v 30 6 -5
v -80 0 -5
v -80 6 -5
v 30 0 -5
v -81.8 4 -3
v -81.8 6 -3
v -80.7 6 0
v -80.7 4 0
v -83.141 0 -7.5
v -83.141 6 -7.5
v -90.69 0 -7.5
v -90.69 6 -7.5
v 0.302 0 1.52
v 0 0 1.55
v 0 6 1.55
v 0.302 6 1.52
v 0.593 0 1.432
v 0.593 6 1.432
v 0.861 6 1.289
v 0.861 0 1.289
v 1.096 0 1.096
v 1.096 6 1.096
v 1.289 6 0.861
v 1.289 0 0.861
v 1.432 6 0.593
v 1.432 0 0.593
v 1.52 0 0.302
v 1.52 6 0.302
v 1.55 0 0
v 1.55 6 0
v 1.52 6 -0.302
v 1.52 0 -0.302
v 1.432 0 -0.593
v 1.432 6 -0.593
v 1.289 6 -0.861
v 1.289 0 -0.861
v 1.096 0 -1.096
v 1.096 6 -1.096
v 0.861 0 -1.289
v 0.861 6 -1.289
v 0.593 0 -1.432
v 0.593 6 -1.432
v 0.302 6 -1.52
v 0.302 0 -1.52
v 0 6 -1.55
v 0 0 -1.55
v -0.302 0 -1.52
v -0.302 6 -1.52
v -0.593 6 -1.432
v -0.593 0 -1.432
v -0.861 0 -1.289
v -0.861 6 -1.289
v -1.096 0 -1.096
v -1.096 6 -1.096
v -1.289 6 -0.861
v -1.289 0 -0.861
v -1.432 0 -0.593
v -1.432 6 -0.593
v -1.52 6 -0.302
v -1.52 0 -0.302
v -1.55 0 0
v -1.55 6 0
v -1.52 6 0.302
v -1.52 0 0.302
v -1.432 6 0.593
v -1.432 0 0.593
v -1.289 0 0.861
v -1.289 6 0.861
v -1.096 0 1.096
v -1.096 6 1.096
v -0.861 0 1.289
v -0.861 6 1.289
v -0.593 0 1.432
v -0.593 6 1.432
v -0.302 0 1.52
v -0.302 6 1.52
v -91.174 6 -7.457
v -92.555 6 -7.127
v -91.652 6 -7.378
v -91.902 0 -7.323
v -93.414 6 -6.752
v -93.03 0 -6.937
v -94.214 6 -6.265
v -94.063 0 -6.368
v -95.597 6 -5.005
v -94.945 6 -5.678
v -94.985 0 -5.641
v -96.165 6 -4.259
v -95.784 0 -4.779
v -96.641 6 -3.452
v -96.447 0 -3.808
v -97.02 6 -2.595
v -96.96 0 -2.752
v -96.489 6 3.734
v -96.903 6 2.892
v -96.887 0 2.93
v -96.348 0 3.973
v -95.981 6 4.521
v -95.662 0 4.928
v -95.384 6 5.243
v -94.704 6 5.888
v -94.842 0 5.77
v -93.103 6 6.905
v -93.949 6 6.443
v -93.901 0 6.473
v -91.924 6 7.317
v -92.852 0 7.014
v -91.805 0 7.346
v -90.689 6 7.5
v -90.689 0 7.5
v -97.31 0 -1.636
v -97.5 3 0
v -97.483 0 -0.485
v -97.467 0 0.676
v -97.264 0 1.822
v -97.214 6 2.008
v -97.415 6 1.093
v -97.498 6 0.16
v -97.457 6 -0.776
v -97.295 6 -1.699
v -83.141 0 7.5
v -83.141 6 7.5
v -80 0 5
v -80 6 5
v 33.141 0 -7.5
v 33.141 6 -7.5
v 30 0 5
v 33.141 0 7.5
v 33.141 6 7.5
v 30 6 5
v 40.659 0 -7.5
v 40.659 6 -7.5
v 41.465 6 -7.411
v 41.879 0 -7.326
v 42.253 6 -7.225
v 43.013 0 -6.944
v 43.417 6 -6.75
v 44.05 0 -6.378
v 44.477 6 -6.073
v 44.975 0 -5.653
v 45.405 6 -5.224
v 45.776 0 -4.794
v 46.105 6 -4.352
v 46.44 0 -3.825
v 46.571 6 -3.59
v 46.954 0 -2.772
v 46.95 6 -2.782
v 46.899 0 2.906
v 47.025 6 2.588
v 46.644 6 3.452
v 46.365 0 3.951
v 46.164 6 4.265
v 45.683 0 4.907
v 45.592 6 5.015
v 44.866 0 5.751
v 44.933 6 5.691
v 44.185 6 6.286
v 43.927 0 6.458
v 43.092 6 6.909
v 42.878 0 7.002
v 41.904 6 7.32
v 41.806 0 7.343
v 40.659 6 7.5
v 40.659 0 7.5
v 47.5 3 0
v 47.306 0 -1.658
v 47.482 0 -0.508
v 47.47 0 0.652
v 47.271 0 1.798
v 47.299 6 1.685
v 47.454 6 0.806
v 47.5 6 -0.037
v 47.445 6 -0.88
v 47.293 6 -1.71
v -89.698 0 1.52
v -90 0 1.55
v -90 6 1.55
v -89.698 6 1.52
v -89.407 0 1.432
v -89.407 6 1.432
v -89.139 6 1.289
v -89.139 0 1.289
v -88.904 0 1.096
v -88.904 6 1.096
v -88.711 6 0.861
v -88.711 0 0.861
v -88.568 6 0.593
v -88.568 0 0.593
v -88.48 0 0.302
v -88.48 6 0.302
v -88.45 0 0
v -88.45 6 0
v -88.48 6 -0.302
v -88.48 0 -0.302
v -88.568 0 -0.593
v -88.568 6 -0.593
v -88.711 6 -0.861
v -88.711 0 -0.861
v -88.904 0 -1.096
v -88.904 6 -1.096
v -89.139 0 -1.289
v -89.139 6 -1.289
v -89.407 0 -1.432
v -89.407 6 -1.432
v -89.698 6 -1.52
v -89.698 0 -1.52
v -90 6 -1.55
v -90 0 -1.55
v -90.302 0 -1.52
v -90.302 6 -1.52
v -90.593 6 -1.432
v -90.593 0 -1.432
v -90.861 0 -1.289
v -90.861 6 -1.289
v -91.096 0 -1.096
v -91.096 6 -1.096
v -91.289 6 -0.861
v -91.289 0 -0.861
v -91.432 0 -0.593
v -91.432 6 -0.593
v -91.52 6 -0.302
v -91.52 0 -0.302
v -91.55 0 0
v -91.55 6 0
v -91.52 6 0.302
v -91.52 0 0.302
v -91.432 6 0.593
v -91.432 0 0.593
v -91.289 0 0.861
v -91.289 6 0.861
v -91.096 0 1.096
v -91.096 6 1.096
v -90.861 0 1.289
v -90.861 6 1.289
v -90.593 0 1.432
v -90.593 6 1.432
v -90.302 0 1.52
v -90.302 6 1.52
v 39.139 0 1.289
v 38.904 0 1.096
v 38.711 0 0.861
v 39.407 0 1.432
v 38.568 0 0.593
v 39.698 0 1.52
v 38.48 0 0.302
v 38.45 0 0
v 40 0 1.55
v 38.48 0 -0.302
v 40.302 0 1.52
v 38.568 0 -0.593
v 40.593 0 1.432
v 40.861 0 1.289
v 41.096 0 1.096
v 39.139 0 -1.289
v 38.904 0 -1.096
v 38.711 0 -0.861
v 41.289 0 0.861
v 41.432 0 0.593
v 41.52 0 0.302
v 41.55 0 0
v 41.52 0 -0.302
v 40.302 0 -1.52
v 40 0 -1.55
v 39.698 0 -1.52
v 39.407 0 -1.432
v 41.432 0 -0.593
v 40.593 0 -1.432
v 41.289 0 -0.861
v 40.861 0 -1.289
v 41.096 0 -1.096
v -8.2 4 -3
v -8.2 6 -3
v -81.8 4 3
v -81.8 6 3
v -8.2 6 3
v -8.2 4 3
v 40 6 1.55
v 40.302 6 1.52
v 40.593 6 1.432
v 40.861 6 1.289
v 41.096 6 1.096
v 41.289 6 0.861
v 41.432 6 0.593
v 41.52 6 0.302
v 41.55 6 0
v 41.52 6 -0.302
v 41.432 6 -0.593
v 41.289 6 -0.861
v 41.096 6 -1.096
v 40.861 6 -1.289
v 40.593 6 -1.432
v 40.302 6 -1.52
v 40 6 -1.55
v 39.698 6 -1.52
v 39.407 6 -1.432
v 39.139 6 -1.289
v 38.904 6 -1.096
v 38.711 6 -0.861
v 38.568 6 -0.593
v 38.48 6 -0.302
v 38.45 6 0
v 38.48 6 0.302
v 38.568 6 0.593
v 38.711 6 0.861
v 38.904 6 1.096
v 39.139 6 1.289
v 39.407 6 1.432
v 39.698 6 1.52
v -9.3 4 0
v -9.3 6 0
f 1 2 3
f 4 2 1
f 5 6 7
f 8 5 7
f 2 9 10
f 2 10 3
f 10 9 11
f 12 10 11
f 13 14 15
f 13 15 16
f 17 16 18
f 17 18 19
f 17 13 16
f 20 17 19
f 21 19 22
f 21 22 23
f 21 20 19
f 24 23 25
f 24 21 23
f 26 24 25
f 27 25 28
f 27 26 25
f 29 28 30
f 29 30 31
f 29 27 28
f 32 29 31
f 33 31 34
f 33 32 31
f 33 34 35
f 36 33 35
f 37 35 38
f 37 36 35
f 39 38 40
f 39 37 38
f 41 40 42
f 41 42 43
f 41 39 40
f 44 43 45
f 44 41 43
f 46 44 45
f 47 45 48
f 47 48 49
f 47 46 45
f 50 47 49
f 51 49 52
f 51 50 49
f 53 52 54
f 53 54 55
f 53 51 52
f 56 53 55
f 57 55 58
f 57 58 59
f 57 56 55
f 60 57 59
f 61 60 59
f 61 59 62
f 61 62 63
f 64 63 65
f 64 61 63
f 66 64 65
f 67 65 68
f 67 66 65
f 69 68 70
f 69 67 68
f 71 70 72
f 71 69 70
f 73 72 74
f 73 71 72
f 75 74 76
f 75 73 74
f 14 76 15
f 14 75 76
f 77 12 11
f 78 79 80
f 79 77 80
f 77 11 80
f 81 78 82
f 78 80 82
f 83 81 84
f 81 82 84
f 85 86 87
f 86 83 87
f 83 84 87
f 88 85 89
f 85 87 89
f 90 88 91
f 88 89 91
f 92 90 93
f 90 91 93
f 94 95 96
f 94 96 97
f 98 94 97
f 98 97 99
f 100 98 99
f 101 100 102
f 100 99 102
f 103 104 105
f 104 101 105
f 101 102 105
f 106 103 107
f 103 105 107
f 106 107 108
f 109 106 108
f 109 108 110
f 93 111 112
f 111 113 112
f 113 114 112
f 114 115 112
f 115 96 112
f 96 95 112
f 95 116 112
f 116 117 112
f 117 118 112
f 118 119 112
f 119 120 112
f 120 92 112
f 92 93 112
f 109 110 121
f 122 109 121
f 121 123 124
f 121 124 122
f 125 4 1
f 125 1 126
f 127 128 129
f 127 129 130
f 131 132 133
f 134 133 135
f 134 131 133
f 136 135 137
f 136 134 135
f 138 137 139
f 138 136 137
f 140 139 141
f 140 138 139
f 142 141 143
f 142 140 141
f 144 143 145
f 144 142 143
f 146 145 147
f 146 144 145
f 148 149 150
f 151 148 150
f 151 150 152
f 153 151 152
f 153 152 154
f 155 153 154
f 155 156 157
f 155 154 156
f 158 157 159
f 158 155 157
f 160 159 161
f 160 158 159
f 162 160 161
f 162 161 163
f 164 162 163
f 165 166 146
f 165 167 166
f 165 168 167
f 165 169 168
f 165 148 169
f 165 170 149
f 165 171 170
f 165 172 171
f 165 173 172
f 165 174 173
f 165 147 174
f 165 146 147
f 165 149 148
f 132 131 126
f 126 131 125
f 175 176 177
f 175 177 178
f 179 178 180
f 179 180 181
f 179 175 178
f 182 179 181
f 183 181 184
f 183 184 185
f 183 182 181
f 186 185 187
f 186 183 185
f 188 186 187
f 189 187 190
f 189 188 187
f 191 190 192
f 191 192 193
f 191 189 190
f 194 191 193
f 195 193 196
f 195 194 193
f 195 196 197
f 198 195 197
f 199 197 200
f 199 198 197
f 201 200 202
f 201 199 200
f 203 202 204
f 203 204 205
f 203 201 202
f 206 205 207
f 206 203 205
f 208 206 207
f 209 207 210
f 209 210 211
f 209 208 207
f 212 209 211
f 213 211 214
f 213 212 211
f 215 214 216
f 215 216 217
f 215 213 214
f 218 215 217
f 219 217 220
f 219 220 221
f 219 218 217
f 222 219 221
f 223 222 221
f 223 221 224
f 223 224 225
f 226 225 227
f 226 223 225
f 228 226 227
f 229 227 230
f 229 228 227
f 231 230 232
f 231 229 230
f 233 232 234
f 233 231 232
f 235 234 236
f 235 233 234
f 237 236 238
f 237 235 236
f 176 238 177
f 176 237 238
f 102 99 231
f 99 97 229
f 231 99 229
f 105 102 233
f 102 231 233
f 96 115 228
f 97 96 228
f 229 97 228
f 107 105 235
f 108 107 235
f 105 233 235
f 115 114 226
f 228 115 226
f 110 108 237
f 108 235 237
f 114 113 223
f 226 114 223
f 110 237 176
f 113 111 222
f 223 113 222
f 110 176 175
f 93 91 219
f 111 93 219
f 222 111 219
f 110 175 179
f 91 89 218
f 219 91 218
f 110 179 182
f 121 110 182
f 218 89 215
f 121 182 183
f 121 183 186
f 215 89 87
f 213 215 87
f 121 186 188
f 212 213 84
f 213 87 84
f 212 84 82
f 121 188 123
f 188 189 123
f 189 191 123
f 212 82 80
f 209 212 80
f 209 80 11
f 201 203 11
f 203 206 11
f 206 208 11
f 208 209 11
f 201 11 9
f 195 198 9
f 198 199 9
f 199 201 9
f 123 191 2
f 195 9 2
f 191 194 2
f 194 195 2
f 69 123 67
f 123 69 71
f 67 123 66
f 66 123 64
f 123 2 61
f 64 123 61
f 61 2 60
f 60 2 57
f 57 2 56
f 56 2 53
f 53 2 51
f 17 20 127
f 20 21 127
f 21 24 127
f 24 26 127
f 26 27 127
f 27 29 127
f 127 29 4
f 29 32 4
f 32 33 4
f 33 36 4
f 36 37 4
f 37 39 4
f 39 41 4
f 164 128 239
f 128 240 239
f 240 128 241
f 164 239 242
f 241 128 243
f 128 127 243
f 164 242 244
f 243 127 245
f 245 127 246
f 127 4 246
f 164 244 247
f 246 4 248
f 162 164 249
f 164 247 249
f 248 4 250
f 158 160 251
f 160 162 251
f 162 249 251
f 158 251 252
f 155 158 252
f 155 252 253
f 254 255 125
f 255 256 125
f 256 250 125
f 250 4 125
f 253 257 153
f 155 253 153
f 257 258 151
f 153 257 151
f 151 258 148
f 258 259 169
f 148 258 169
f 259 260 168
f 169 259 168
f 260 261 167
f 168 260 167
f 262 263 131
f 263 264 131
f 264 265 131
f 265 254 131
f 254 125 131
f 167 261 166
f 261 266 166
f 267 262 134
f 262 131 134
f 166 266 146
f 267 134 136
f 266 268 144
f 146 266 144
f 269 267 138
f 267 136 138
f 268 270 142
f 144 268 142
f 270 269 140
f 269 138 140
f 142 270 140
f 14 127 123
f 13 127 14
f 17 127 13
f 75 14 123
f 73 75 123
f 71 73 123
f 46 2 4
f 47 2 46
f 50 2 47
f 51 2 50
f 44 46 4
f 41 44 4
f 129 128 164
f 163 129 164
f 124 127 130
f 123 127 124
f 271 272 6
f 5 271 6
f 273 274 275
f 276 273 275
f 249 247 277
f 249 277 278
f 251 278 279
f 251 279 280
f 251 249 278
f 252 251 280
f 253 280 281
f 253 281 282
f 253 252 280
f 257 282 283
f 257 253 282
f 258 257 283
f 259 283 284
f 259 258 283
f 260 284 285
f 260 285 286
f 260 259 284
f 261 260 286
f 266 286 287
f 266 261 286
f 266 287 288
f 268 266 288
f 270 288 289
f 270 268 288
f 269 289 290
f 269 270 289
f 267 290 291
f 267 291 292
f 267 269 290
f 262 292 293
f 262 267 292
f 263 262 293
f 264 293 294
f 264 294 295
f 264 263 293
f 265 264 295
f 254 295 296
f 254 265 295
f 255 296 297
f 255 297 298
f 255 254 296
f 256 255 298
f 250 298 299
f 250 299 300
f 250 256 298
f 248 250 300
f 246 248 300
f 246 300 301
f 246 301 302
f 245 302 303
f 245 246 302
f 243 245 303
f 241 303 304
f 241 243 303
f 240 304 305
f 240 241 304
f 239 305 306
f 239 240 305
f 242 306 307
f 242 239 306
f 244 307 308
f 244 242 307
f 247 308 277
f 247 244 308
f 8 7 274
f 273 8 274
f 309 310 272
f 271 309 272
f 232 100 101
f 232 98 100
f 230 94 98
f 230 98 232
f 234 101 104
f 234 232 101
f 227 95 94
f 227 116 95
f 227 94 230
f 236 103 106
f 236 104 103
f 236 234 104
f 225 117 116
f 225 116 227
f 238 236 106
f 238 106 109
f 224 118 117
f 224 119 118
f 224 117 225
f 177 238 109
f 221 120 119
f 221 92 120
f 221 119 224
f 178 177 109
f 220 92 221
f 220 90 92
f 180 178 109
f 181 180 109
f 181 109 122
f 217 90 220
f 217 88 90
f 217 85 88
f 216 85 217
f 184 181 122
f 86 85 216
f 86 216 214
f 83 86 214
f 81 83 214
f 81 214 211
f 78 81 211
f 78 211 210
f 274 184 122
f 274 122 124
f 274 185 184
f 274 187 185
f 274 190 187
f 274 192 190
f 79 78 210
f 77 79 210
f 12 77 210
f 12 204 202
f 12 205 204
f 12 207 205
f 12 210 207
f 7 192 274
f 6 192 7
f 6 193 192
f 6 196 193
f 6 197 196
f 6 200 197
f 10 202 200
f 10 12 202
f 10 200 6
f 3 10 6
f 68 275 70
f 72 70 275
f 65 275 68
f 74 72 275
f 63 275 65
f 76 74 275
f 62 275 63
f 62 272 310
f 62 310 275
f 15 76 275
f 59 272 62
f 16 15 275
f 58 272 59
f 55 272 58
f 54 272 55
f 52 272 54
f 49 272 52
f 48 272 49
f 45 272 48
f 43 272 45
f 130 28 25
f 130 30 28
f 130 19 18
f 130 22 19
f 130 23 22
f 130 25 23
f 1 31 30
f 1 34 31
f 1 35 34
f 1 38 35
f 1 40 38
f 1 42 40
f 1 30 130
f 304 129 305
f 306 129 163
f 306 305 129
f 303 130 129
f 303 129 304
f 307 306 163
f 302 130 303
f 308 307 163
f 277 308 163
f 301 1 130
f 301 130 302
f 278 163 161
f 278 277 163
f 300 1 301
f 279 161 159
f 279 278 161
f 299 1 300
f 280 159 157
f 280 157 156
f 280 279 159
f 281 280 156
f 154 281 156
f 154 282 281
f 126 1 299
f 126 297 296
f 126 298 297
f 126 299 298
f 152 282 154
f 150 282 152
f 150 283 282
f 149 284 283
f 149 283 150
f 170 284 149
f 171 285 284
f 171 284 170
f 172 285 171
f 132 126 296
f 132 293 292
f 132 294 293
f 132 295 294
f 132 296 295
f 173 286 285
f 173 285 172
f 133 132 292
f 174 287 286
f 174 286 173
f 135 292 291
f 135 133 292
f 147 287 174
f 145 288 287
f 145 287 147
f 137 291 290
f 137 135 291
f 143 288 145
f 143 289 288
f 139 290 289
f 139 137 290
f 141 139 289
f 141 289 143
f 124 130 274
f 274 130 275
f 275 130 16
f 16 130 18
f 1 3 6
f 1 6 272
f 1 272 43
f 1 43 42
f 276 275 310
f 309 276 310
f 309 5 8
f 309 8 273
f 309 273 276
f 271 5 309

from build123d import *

# Parameters (mm, degrees)
ESQUISSE2_R             = 1.55
BOSS_EXTRU_1_DEPTH      = 6
ESQUISSE3_W             = 170
ESQUISSE3_H             = 35
ENL_V_MAT_EXTRU_1_DEPTH = 10
ENL_V_MAT_EXTRU_2_DEPTH = 2


with BuildPart() as part:
    # Esquisse2 → Boss.-Extru.1 (new body)
    with BuildSketch(Plane(origin=(0, 0, 0), x_dir=(1, 0, 0), z_dir=(0, 1, 0))):
        Polygon((30, 7.5), (-90, 7.5), (-100, 7.5), (-100, -7.5), (-90, -7.5), (30, -7.5), (40, -7.5), (50, -7.5), (50, 7.5), (40, 7.5), align=None)
        with Locations(Location((-90, 0, 0), (0, 0, 270))):
            Circle(ESQUISSE2_R, mode=Mode.SUBTRACT)
        with Locations(Location((0, 0, 0), (0, 0, 270))):
            Circle(ESQUISSE2_R, mode=Mode.SUBTRACT)
        with Locations(Location((40, 0, 0), (0, 0, 270))):
            Circle(ESQUISSE2_R, mode=Mode.SUBTRACT)
    extrude(amount=BOSS_EXTRU_1_DEPTH)

    # Esquisse3 → Enlèv. mat.-Extru.1 (cut)
    with BuildSketch(Plane.XZ):
        with Locations((-25, 0)):
            Rectangle(ESQUISSE3_W, ESQUISSE3_H)
        with BuildLine():
            Line((-90, -7.5), (-83.140864445, -7.5))
            Line((-83.140864445, -7.5), (-80, -5))
            Line((-80, -5), (0, -5))
            Line((0, -5), (30, -5))
            Line((30, -5), (33.140864445, -7.5))
            Line((33.140864445, -7.5), (40, -7.5))
            add(Edge.make_bspline(
                [(40, -7.5), (44.292893219, -7.707106781), (50.707106781, 0), (44.292893219, 7.707106781), (40, 7.5)],
                knots=[0, 0, 0, 0, 0.5, 1, 1, 1, 1], degree=3))
            Line((40, 7.5), (33.140864445, 7.5))
            Line((33.140864445, 7.5), (30, 5))
            Line((30, 5), (0, 5))
            Line((0, 5), (-80, 5))
            Line((-80, 5), (-83.140864445, 7.5))
            Line((-83.140864445, 7.5), (-90, 7.5))
            add(Edge.make_bspline(
                [(-90, -7.5), (-94.266151252, -7.718988485), (-100.733567708, 6.0631e-05), (-94.266713321, 7.718514748), (-90, 7.5)],
                knots=[0, 0, 0, 0, 0.500005708, 1, 1, 1, 1], degree=3))
        make_face(mode=Mode.SUBTRACT)
    extrude(amount=-ENL_V_MAT_EXTRU_1_DEPTH, mode=Mode.SUBTRACT)

    # Esquisse4 → Enlèv. mat.-Extru.2 (cut)
    with BuildSketch(Plane(origin=(0, 6, 0), x_dir=(1, 0, 0), z_dir=(0, 1, 0))):
        Polygon((-81.8, 3), (-80.7, 0), (-81.8, -3), (-8.2, -3), (-9.3, 0), (-8.2, 3), align=None)
    extrude(amount=-ENL_V_MAT_EXTRU_2_DEPTH, mode=Mode.SUBTRACT)


solid = part.part
